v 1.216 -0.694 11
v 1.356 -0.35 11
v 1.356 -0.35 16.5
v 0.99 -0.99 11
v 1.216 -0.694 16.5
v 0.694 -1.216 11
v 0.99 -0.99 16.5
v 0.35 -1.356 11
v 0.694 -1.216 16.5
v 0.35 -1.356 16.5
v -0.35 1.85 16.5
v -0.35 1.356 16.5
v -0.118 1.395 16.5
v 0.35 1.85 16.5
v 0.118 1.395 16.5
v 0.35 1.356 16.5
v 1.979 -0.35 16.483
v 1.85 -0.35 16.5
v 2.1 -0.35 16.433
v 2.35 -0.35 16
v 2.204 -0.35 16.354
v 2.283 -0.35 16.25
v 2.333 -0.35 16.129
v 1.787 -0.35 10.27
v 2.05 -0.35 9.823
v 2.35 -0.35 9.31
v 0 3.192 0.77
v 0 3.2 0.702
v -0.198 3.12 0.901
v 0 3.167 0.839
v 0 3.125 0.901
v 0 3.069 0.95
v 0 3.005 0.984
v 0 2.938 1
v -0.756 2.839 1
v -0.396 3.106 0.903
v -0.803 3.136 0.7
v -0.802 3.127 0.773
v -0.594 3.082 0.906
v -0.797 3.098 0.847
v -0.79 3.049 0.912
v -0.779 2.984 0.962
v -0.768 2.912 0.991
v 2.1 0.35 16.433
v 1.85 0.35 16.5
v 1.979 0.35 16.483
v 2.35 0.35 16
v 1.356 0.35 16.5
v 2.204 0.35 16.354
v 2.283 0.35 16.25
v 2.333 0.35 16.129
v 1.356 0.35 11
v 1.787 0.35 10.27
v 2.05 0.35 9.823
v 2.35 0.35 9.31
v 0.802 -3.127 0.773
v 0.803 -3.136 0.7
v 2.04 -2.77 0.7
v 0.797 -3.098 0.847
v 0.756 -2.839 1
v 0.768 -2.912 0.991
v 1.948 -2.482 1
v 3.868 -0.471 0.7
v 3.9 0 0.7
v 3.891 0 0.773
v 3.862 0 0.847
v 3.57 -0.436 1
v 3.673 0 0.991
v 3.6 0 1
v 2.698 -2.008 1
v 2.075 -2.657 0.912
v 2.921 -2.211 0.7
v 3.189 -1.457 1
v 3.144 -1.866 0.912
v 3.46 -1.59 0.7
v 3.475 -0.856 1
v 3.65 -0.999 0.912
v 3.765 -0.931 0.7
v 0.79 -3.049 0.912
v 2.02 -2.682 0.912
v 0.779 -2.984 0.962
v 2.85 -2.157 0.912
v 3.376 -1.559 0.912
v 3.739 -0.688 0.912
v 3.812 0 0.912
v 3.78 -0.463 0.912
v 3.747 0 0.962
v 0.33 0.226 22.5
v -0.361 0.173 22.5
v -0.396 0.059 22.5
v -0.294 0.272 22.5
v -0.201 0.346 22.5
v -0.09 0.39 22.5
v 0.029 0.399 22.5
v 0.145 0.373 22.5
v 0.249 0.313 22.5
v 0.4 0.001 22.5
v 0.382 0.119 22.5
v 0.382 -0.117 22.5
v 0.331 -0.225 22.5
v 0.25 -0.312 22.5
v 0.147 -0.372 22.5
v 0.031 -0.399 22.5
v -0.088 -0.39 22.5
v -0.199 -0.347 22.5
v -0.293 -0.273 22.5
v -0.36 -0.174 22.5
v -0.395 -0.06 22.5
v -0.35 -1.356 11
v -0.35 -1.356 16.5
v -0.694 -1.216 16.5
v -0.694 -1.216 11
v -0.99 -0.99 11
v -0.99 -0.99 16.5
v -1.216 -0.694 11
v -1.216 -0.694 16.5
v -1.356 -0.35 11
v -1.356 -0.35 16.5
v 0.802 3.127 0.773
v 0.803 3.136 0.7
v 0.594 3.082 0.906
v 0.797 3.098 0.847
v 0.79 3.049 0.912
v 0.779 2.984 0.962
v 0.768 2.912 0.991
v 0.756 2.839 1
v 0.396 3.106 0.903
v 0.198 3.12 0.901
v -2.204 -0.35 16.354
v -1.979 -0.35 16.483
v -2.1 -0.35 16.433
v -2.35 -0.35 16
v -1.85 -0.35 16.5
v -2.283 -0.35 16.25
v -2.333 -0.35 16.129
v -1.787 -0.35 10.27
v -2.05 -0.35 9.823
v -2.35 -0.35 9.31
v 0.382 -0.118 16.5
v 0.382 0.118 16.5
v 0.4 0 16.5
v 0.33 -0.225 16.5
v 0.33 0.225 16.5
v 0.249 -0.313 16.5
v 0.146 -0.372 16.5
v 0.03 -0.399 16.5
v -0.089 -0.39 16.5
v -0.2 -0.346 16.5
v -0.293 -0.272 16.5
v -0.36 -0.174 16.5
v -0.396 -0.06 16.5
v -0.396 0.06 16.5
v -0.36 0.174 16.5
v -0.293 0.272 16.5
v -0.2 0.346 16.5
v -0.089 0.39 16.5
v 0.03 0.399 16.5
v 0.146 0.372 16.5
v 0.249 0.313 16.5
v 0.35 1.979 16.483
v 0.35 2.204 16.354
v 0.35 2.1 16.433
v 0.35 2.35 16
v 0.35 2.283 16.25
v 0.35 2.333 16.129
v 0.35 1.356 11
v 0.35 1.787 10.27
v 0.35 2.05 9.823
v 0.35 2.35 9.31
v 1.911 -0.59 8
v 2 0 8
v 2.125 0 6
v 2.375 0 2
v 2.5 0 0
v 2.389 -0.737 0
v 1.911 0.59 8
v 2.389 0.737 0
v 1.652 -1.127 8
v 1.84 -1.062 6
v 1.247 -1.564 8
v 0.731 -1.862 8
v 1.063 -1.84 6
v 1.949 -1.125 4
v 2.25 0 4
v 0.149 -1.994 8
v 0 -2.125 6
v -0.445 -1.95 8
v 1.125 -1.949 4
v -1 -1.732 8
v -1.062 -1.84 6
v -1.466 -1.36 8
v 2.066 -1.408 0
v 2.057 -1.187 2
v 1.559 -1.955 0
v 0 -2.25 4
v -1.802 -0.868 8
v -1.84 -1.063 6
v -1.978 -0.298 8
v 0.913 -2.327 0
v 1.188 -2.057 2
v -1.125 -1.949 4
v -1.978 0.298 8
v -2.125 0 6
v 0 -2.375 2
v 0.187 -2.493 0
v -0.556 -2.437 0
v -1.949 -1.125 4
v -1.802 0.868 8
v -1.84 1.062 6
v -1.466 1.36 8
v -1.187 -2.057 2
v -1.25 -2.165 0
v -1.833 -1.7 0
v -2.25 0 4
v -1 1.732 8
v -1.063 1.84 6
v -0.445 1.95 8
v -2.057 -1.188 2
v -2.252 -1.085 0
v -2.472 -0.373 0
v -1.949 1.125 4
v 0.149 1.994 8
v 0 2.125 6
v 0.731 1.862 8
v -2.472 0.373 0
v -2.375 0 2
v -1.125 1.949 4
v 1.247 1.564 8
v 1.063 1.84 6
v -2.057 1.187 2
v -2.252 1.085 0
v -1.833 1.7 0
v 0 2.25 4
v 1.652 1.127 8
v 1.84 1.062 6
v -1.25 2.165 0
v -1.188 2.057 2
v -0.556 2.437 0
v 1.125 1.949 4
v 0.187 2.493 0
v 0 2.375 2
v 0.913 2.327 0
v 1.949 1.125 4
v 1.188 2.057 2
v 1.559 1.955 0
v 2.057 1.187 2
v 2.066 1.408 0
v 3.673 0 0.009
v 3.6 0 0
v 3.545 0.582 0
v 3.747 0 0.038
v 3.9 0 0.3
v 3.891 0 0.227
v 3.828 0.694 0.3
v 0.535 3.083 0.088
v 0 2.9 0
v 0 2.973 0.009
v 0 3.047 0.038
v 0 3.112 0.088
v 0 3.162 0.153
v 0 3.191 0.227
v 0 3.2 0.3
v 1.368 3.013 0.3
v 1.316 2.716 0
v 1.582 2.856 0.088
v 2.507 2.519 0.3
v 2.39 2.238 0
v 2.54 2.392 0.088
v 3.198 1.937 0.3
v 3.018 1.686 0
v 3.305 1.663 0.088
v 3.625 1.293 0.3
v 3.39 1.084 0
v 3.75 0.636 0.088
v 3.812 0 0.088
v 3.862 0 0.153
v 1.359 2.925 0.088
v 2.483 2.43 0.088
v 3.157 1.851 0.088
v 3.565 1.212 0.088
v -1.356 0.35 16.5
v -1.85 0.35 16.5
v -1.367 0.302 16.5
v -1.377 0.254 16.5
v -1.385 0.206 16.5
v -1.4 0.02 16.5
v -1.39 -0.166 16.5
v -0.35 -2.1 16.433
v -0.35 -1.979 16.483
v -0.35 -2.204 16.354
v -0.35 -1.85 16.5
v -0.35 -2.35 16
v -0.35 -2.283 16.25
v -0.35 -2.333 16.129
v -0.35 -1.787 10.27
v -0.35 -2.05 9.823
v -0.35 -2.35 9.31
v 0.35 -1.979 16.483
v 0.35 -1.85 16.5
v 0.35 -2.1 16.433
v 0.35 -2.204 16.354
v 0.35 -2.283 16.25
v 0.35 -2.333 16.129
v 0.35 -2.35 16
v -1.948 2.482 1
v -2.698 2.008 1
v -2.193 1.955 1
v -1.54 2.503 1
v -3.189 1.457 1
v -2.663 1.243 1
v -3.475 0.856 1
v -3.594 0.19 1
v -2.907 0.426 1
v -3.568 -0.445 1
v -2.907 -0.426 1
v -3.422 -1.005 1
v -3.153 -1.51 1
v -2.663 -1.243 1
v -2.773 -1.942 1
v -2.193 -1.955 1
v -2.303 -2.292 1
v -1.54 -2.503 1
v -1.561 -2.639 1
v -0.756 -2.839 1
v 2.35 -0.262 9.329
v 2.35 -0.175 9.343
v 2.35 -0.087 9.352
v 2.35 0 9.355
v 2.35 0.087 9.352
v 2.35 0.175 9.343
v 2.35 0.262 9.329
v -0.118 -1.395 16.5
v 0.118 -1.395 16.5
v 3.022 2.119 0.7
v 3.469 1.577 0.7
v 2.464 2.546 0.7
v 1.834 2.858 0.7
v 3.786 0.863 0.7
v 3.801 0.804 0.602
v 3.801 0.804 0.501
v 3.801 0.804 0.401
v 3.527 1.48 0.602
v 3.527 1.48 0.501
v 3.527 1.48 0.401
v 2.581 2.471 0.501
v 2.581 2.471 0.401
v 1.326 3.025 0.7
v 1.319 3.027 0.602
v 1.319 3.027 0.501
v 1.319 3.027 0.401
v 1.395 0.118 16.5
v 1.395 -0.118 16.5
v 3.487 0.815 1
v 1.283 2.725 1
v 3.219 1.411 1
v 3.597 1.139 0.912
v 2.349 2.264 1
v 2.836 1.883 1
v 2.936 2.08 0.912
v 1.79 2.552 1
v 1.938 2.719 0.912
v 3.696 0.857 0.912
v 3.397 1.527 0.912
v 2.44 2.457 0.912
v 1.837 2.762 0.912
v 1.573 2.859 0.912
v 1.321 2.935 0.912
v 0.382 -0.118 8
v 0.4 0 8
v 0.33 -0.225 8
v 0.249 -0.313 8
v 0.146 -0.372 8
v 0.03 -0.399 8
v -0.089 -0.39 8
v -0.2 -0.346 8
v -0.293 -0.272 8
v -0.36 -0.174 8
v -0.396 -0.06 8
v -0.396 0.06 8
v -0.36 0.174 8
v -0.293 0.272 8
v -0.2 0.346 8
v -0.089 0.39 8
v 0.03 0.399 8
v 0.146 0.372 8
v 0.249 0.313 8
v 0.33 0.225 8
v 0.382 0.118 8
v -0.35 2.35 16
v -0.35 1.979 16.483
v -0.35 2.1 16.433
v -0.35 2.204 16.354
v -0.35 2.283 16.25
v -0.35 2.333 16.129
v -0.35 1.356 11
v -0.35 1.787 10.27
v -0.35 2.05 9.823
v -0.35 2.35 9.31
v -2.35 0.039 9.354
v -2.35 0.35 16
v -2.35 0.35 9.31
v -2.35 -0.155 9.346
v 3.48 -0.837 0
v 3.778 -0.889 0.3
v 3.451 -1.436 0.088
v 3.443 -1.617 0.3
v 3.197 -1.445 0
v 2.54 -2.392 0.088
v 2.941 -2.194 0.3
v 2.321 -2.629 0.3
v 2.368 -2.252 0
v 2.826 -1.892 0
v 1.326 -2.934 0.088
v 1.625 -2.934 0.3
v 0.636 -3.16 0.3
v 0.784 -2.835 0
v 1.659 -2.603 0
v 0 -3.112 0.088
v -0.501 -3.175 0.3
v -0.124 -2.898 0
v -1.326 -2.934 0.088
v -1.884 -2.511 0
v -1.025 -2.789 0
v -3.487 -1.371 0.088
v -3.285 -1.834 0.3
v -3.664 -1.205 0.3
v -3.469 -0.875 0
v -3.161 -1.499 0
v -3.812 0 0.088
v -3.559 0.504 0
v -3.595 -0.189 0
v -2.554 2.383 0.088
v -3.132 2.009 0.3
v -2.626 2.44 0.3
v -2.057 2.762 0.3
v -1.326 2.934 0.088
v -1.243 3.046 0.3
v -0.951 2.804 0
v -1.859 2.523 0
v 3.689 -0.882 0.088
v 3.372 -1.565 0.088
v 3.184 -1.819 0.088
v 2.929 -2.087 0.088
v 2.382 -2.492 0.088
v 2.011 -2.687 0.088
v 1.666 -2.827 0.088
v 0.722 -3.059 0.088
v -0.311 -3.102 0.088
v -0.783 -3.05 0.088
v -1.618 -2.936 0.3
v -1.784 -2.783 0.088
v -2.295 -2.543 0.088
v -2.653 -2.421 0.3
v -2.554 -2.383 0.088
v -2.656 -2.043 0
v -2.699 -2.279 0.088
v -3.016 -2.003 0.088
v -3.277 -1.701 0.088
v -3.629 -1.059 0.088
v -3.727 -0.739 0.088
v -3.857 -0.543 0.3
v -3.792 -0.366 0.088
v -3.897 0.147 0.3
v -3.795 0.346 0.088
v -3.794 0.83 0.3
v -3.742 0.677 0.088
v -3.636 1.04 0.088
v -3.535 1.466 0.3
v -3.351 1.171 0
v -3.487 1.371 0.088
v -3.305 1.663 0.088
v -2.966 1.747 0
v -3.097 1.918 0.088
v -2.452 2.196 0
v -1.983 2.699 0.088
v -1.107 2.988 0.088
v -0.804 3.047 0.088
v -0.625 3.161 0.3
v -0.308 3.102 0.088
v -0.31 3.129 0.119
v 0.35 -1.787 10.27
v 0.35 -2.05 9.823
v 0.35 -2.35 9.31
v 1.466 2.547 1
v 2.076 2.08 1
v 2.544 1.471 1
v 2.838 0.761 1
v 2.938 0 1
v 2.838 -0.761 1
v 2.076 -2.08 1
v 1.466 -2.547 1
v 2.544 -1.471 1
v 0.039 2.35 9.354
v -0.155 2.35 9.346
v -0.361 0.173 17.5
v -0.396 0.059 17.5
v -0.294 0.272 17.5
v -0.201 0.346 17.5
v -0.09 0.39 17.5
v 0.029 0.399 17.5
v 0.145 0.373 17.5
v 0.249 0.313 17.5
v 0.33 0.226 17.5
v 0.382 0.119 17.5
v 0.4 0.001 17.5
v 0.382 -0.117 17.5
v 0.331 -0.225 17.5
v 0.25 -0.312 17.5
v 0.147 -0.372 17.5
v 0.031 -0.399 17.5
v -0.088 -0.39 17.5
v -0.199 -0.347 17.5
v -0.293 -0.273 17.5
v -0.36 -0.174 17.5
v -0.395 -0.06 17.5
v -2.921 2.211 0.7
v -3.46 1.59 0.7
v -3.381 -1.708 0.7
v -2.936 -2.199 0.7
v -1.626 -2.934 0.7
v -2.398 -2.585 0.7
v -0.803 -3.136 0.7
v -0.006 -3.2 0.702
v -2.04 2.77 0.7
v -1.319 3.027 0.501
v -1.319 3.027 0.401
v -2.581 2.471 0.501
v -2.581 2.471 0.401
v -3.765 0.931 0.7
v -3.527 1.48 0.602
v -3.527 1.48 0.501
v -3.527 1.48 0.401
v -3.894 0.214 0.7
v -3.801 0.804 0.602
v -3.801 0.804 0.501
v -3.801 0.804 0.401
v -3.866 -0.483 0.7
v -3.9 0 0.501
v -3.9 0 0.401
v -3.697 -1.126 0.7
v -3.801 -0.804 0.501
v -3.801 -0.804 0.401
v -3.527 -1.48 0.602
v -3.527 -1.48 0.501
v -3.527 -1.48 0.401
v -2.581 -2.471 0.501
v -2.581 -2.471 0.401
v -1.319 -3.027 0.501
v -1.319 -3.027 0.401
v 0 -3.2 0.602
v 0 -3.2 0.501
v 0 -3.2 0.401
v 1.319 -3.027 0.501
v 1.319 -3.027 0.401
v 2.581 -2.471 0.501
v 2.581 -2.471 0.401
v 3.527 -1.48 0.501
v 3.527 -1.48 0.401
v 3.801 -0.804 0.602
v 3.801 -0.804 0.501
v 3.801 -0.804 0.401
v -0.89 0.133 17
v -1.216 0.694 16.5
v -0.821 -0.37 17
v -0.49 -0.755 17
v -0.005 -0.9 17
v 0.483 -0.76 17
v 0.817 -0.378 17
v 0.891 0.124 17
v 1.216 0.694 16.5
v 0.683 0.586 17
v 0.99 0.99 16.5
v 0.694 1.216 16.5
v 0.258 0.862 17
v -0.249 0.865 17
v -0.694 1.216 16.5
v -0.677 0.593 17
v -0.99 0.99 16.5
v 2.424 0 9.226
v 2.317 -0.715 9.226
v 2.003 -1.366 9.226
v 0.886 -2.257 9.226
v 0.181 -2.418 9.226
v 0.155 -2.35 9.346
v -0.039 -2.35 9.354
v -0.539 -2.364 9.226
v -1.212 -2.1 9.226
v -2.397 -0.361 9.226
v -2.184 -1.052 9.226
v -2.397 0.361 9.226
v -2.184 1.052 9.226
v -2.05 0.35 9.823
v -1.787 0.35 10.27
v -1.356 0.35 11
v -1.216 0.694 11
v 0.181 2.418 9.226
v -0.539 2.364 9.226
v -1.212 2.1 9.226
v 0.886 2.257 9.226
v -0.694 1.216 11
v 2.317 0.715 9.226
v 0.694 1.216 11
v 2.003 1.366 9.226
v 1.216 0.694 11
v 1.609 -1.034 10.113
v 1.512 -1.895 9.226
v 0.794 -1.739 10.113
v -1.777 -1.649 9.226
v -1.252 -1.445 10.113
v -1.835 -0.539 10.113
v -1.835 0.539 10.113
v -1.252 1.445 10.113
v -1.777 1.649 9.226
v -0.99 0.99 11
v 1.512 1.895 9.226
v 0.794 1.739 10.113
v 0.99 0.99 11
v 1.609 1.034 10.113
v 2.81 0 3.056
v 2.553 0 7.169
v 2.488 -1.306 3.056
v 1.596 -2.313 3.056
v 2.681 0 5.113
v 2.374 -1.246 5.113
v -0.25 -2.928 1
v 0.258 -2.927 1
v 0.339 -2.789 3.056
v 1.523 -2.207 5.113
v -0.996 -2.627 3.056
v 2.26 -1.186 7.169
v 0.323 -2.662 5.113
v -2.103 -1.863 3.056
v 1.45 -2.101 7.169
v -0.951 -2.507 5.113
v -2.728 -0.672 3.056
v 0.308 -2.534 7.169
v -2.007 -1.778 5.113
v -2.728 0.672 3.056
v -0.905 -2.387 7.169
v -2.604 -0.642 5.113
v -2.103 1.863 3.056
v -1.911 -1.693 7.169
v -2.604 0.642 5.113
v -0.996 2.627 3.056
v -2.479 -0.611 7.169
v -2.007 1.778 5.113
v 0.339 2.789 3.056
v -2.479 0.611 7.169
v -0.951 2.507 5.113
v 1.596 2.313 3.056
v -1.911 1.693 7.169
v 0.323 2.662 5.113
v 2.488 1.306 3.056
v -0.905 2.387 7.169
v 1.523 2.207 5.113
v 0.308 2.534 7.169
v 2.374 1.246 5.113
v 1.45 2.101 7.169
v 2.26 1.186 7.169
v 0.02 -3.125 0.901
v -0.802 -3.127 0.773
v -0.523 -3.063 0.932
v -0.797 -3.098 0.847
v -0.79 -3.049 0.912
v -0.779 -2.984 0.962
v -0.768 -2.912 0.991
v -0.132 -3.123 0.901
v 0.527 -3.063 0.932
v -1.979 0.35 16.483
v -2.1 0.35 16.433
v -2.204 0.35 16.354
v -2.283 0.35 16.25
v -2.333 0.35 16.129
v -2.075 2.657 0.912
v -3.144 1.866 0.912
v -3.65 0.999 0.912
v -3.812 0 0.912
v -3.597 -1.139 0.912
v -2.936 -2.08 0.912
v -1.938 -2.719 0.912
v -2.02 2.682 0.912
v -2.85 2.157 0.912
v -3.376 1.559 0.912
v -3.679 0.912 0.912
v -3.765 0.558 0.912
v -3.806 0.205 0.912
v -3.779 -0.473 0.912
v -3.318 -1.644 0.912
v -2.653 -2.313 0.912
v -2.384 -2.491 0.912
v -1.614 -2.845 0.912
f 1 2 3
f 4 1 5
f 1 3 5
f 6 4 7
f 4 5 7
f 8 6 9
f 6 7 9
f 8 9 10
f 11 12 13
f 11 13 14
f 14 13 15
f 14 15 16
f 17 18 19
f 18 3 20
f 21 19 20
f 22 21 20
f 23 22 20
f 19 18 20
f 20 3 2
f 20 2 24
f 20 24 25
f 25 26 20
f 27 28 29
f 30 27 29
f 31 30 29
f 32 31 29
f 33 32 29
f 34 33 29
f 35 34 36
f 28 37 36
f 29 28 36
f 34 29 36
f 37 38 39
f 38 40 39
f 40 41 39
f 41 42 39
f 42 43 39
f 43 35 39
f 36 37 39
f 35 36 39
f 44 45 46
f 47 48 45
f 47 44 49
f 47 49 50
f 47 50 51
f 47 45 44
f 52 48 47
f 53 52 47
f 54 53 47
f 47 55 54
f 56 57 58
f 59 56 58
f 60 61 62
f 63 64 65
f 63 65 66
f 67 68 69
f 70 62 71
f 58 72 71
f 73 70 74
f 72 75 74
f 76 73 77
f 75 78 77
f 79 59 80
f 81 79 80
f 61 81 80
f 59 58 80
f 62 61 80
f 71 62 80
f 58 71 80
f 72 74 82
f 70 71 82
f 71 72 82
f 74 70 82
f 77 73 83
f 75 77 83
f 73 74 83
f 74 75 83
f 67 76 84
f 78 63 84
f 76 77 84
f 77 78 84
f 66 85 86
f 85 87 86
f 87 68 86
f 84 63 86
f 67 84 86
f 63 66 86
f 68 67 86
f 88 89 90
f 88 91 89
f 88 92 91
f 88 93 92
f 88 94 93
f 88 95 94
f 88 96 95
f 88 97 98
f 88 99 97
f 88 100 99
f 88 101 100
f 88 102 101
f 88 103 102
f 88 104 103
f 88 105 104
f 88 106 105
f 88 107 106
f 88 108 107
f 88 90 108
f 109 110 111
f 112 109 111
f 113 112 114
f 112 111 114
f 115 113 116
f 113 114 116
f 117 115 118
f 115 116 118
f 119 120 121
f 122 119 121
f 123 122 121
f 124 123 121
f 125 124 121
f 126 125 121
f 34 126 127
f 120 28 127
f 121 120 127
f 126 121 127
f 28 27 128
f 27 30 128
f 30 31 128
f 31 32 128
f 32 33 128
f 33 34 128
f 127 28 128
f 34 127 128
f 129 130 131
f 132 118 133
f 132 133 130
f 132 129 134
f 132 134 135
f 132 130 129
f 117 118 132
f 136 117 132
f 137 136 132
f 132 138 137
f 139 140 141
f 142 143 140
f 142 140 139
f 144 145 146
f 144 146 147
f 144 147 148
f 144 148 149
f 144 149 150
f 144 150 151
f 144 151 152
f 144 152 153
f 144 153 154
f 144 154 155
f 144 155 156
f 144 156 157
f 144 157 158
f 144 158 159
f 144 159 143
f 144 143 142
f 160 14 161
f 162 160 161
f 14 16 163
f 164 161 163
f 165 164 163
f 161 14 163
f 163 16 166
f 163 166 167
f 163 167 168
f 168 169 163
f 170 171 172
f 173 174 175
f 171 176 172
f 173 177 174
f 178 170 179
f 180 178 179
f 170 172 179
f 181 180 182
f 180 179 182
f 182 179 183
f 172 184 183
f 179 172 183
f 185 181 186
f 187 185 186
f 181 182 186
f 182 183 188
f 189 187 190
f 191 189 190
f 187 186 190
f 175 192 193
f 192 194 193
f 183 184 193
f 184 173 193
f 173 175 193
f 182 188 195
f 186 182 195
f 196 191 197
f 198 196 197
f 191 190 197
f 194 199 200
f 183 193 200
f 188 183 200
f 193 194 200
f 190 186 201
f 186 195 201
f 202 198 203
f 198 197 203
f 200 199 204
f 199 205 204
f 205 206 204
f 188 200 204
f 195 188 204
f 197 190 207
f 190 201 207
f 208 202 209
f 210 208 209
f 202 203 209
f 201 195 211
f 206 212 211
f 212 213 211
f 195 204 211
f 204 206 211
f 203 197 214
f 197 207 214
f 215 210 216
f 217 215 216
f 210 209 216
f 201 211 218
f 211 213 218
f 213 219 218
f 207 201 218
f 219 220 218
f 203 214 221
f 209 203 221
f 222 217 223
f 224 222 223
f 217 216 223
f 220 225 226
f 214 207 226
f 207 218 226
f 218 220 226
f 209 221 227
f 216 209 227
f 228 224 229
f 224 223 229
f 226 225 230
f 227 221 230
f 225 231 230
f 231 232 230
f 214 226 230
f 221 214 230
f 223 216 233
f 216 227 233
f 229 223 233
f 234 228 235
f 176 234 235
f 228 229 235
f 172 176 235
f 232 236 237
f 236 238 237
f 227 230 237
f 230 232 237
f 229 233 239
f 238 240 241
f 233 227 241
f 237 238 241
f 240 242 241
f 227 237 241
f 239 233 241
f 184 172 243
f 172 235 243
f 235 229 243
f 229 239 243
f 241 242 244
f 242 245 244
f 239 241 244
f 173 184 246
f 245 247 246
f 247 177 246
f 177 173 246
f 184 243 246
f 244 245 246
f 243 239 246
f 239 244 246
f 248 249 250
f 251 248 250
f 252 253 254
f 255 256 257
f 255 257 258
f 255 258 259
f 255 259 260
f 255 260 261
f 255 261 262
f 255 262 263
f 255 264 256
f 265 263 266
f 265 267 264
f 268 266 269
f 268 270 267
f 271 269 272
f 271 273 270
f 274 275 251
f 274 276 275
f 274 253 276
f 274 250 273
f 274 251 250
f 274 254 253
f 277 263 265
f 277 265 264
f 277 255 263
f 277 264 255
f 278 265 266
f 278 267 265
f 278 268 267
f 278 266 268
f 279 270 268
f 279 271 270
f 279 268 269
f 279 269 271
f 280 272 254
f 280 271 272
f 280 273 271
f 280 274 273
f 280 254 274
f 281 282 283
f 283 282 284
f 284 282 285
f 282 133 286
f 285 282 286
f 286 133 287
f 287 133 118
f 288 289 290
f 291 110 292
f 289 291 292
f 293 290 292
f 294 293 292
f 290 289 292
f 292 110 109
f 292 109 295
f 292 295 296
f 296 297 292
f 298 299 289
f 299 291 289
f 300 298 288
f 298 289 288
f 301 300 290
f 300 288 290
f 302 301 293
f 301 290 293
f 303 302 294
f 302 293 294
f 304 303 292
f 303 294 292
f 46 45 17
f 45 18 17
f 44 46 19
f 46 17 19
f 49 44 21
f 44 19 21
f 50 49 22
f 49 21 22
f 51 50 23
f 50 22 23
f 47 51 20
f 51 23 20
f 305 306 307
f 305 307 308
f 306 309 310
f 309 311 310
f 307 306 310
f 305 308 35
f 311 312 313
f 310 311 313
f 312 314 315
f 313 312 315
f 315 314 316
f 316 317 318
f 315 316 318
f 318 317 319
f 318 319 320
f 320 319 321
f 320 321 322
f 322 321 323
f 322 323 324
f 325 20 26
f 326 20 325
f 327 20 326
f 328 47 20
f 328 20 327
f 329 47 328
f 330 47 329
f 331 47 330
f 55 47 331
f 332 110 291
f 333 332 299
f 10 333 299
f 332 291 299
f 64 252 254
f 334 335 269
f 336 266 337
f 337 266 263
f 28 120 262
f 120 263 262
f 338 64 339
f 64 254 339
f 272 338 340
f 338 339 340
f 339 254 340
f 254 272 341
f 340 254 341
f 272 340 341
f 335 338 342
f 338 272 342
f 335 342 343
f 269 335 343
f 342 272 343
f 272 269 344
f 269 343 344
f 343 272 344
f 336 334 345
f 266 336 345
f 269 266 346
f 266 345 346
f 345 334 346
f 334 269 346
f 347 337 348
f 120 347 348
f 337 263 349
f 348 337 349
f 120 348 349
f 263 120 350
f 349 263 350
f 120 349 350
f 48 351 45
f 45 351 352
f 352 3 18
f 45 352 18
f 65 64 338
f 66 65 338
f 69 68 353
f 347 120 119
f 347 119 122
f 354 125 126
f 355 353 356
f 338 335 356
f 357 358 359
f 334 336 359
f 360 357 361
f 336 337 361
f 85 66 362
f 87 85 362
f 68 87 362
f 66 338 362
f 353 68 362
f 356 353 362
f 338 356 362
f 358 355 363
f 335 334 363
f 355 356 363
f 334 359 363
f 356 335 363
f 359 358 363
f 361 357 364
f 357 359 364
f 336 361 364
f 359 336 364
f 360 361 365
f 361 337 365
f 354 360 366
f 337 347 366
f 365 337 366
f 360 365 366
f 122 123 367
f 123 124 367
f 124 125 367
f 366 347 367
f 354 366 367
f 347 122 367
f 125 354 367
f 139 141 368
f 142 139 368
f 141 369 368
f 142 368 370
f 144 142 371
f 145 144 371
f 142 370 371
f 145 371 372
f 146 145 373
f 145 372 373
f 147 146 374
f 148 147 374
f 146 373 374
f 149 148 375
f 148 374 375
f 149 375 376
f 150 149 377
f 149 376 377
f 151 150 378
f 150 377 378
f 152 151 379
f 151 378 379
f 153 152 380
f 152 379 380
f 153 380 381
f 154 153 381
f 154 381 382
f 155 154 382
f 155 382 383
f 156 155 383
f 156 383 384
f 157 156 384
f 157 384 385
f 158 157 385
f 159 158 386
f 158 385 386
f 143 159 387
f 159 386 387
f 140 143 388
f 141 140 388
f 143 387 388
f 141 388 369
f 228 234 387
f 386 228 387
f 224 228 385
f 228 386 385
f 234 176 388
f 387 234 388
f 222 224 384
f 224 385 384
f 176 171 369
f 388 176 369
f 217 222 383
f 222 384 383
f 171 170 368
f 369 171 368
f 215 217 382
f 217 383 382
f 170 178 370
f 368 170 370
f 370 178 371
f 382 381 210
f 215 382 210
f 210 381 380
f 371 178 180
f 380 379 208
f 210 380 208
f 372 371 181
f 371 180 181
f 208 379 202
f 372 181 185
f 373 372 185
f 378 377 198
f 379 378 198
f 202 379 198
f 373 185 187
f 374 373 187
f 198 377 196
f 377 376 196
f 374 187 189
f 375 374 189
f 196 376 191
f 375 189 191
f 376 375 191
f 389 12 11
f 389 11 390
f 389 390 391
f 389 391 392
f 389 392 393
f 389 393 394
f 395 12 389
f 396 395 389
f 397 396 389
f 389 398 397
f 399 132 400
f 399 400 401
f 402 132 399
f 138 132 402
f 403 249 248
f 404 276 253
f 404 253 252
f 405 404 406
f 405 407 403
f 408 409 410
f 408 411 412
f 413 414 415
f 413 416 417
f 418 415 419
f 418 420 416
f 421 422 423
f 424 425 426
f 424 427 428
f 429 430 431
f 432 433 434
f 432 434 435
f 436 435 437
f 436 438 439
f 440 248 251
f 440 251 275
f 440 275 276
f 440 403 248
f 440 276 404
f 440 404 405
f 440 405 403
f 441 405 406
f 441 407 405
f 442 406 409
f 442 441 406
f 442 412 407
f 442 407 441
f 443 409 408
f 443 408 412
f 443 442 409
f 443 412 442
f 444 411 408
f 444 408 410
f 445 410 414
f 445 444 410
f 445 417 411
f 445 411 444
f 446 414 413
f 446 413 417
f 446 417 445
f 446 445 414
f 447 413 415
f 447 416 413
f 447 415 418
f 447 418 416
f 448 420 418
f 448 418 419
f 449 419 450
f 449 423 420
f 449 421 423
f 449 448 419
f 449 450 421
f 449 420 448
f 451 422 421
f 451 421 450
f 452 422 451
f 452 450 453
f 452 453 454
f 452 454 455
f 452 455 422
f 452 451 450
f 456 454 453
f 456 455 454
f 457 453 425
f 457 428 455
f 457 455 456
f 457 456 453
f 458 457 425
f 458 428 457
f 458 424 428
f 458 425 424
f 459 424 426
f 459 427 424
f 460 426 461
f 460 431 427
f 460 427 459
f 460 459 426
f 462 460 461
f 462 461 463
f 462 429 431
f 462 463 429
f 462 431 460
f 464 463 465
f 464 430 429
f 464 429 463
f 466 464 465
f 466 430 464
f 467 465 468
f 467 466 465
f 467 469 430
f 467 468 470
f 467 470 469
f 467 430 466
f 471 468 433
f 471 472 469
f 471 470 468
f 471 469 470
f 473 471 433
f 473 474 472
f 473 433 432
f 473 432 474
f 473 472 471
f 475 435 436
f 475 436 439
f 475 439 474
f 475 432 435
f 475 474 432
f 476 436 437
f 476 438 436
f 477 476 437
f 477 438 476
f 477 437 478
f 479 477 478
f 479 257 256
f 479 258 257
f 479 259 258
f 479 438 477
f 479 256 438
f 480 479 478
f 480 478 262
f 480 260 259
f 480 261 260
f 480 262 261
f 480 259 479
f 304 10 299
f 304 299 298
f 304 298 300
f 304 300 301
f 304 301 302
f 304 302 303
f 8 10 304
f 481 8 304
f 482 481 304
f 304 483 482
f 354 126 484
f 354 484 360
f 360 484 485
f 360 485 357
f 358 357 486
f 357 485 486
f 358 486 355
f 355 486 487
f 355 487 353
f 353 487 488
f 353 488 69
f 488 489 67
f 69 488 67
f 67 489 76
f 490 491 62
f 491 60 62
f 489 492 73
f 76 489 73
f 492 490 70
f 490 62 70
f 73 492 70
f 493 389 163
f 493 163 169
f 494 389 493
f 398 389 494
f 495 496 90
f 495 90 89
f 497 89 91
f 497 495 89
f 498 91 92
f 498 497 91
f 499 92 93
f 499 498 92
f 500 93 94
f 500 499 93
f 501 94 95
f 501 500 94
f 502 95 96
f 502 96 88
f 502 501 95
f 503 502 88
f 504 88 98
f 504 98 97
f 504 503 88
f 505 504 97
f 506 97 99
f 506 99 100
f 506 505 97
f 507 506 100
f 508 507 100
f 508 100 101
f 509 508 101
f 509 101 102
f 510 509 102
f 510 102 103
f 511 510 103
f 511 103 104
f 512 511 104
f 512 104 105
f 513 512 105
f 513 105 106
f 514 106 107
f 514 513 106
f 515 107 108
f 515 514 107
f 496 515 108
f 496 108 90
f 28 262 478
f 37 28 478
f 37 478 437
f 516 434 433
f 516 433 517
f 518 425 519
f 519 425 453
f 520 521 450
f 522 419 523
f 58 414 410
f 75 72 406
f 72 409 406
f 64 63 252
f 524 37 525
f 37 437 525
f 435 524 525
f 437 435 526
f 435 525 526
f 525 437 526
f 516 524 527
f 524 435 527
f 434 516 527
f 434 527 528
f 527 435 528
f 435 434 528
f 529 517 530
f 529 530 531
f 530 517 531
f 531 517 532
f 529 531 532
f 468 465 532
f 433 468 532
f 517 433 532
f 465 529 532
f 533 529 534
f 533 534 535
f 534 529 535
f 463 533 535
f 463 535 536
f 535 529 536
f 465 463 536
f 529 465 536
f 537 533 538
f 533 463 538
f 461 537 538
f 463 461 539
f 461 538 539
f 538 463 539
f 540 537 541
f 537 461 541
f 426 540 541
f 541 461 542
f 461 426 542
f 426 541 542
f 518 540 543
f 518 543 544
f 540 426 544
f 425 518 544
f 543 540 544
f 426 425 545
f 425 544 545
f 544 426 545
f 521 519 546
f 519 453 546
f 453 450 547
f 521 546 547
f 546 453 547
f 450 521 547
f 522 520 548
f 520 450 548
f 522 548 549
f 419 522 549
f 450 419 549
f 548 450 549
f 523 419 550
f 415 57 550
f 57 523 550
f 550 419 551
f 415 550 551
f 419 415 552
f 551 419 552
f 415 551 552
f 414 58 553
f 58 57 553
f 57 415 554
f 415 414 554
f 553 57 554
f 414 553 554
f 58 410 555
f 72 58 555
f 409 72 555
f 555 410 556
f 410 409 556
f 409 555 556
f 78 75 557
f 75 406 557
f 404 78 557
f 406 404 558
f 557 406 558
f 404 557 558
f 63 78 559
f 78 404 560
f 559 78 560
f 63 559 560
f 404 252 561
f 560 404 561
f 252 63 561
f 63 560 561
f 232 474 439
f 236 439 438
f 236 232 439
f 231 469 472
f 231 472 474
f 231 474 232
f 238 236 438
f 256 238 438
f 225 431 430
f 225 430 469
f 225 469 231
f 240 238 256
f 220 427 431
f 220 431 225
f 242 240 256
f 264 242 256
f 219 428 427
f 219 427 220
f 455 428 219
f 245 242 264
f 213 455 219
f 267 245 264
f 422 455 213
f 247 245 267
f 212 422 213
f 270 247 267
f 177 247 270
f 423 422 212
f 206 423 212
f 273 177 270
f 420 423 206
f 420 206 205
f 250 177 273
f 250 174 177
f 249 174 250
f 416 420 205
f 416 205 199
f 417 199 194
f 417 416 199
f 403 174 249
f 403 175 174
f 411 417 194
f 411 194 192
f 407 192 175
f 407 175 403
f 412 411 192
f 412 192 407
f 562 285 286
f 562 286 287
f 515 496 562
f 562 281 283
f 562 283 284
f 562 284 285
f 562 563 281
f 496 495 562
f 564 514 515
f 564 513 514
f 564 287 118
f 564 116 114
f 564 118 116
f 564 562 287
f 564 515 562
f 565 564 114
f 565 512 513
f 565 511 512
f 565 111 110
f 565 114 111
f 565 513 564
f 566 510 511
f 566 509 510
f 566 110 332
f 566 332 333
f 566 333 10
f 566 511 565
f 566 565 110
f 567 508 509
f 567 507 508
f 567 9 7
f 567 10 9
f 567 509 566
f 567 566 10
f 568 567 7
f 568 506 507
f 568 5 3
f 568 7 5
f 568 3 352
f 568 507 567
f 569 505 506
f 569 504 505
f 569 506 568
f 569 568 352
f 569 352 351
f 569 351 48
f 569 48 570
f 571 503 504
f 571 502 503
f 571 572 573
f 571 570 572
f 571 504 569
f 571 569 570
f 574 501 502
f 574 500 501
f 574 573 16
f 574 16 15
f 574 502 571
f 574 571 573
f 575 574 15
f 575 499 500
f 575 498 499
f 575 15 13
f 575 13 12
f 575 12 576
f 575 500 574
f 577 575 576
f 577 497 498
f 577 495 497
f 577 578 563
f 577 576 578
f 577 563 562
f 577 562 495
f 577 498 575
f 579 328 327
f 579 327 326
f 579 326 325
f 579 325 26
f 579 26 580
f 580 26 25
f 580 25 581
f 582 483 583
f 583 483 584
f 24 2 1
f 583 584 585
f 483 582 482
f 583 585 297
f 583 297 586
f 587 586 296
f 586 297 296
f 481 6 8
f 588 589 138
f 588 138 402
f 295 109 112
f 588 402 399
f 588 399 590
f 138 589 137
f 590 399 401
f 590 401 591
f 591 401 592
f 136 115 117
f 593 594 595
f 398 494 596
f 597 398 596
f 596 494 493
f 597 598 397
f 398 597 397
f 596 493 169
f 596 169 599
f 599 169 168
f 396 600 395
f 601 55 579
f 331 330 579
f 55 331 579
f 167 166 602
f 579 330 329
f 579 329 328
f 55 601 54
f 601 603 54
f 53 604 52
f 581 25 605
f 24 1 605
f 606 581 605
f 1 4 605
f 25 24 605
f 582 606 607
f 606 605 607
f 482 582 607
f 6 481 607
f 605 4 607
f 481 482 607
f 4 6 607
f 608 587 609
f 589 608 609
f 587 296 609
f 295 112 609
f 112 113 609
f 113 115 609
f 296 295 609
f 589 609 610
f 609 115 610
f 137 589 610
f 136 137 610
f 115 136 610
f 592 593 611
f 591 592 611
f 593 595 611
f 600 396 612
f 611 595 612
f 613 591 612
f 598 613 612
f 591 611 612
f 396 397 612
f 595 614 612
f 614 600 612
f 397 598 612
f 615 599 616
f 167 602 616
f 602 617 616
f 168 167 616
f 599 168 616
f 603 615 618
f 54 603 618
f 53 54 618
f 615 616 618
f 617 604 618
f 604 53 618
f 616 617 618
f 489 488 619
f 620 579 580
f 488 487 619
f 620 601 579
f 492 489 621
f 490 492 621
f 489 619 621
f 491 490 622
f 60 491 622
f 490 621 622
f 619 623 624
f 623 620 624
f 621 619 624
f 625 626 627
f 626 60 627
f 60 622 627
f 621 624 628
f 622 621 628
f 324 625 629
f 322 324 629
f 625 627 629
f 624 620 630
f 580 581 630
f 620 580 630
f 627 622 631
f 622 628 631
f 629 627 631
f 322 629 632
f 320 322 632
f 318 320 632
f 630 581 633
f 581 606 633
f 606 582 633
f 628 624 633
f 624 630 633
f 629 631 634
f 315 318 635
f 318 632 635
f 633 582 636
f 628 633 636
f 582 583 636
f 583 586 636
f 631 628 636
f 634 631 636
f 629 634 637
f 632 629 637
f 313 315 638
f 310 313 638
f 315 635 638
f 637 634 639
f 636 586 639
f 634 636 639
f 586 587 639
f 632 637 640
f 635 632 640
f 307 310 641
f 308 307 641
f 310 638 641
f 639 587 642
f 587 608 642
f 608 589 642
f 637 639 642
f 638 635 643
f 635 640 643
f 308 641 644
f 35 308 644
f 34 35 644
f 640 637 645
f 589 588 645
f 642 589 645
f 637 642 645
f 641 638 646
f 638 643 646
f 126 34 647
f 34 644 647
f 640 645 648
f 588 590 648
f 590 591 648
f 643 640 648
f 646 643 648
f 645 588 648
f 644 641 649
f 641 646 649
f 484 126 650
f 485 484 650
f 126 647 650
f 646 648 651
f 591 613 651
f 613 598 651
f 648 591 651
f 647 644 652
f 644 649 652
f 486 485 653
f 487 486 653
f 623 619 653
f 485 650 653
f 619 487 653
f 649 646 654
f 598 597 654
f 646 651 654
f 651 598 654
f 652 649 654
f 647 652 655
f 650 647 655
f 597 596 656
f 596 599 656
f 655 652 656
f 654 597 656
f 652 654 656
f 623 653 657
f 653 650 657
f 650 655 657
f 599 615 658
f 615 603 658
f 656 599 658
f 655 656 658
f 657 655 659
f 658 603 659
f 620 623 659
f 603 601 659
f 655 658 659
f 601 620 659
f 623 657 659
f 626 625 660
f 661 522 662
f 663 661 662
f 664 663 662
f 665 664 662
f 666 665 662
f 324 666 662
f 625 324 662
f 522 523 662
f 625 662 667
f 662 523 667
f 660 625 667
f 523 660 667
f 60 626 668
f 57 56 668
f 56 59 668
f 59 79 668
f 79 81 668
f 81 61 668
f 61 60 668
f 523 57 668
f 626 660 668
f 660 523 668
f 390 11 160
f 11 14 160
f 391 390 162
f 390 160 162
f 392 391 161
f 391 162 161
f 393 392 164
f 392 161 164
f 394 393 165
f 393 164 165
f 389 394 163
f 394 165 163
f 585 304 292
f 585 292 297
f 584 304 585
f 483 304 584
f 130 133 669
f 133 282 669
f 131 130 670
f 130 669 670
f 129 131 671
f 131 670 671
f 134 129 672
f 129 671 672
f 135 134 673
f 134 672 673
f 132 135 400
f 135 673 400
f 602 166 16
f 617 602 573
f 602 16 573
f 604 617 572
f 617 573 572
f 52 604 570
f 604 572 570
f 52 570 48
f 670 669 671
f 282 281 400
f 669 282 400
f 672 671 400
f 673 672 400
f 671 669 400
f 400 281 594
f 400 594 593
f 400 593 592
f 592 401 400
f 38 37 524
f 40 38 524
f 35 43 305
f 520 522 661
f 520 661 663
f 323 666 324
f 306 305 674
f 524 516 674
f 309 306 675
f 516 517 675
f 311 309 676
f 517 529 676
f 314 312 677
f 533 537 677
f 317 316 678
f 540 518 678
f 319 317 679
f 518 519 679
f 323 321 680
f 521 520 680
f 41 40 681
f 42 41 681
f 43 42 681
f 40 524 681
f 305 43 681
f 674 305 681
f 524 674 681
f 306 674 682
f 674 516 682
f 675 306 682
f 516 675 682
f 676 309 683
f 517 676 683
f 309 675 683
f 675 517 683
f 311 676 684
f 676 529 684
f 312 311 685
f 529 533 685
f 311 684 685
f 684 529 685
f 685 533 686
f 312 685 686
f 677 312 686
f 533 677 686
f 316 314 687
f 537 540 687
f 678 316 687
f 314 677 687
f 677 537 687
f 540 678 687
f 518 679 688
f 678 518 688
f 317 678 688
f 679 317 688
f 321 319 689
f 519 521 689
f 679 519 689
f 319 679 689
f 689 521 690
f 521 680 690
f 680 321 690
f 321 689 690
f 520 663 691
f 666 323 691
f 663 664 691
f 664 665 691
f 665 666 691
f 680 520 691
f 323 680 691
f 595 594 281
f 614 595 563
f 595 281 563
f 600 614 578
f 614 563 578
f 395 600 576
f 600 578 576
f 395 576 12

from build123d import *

# Parameters (mm, degrees)
BOSS_EXTRUDE1_DEPTH = 0.35
CIRPATTERN1_COUNT   = 4
SKETCH4_R           = 5.5
CUT_EXTRUDE2_DEPTH  = 18.397413601
FILLET1_R           = 0.3
SKETCH6_W           = 0.4
SKETCH6_H           = 5
FILLET2_R           = 0.5


with BuildPart() as part:
    # Sketch1 → Revolve1 (revolve)
    with BuildSketch(Plane(origin=(0, 0, 0), x_dir=(1, 0, 0), z_dir=(0, 1, 0))):
        Polygon((2.5, 0), (3, 0), (3.9, 0), (3.9, -1), (2.938475611, -1), (2.424366542, -9.225745104), (1.4, -11), (1.4, -16.5), (0.4, -16.5), (0.4, -8), (2, -8), align=None)
    revolve(axis=Axis((0, 0, 16.5), (0, 0, -1)))

    # Sketch2 → Boss-Extrude1 (add, symmetric)
    with BuildSketch(Plane(origin=(0, 0, 0), x_dir=(1, 0, 0), z_dir=(0, 1, 0))):
        Polygon((2.35, -9.094744112), (1.25, -11), (1.25, -16.5), (2.35, -16.5), align=None)
    boss_extrude1 = extrude(amount=BOSS_EXTRUDE1_DEPTH, both=True)

    # CirPattern1: Boss-Extrude1 ×4 about axis
    cirpattern1_axis = Axis((0, 0, 0), (0, 0, 1))
    for i in range(1, CIRPATTERN1_COUNT):
        add(boss_extrude1.rotate(cirpattern1_axis, i * 360 / CIRPATTERN1_COUNT))

    # Sketch4 → Cut-Extrude2 (cut, through all)
    with BuildSketch(Plane(origin=(0, 0, 0), x_dir=(-1, 0, 0), z_dir=(0, 0, -1))):
        Circle(SKETCH4_R)
        with BuildLine():
            add(Edge.make_bspline(
                [(0, 3.2), (-1.681599767, 3.2), (-3.9, 2.322621385), (-3.9, 0)],
                knots=[0, 0, 0, 0, 1, 1, 1, 1], degree=3))
            add(Edge.make_bspline(
                [(0, -3.2), (-1.681599767, -3.2), (-3.9, -2.322621385), (-3.9, 0)],
                knots=[0, 0, 0, 0, 1, 1, 1, 1], degree=3))
            add(Edge.make_bspline(
                [(0, -3.2), (1.681599767, -3.2), (3.9, -2.322621385), (3.9, 0)],
                knots=[0, 0, 0, 0, 1, 1, 1, 1], degree=3))
            add(Edge.make_bspline(
                [(0, 3.2), (1.681599767, 3.2), (3.9, 2.322621385), (3.9, 0)],
                knots=[0, 0, 0, 0, 1, 1, 1, 1], degree=3))
        make_face(mode=Mode.SUBTRACT)
    extrude(amount=-CUT_EXTRUDE2_DEPTH, mode=Mode.SUBTRACT)

    # Fillet1
    fillet1_edges = [part.edges().sort_by_distance(p)[0] for p in [
        (2.666281983, -2.412027807, 0),
        (-2.666281983, -2.412027807, 0),
        (-2.666281983, 2.412027807, 0),
        (2.666281983, 2.412027807, 0),
        (2.666282105, -2.412027711, 1),
        (-2.666282105, -2.412027711, 1),
        (-2.666282105, 2.412027711, 1),
        (2.666282105, 2.412027711, 1),
    ]]
    fillet(fillet1_edges, radius=FILLET1_R)

    # Sketch5 → Revolve2 (revolve)
    with BuildSketch(Plane(origin=(0, 0, 0), x_dir=(1, 0, 0), z_dir=(0, 1, 0)), mode=Mode.PRIVATE) as revolve2_sk:
        Polygon((0, -16.5), (1.4, -16.5), (0.4, -17.5), (0, -17.5), align=None)
    revolve(revolve2_sk.sketch.rotate(Axis((0, 0, 0), (0, 0, 1)), 171.528954844), axis=Axis((0, 0, 0), (0, 0, 1)))

    # Sketch6 → Revolve3 (revolve)
    with BuildSketch(Plane(origin=(0, 0, 0), x_dir=(1, 0, 0), z_dir=(0, 1, 0)), mode=Mode.PRIVATE) as revolve3_sk:
        with Locations((0.2, -20)):
            Rectangle(SKETCH6_W, SKETCH6_H)
    revolve(revolve3_sk.sketch.rotate(Axis((0, 0, 22.5), (0, 0, -1)), 188.471045156), axis=Axis((0, 0, 22.5), (0, 0, -1)))

    # Fillet2
    fillet2_edges = [part.edges().sort_by_distance(p)[0] for p in [
        (2.35, 0, 16.5),
        (0, 2.35, 16.5),
        (-2.35, 0, 16.5),
        (0, -2.35, 16.5),
    ]]
    fillet(fillet2_edges, radius=FILLET2_R)


solid = part.part
